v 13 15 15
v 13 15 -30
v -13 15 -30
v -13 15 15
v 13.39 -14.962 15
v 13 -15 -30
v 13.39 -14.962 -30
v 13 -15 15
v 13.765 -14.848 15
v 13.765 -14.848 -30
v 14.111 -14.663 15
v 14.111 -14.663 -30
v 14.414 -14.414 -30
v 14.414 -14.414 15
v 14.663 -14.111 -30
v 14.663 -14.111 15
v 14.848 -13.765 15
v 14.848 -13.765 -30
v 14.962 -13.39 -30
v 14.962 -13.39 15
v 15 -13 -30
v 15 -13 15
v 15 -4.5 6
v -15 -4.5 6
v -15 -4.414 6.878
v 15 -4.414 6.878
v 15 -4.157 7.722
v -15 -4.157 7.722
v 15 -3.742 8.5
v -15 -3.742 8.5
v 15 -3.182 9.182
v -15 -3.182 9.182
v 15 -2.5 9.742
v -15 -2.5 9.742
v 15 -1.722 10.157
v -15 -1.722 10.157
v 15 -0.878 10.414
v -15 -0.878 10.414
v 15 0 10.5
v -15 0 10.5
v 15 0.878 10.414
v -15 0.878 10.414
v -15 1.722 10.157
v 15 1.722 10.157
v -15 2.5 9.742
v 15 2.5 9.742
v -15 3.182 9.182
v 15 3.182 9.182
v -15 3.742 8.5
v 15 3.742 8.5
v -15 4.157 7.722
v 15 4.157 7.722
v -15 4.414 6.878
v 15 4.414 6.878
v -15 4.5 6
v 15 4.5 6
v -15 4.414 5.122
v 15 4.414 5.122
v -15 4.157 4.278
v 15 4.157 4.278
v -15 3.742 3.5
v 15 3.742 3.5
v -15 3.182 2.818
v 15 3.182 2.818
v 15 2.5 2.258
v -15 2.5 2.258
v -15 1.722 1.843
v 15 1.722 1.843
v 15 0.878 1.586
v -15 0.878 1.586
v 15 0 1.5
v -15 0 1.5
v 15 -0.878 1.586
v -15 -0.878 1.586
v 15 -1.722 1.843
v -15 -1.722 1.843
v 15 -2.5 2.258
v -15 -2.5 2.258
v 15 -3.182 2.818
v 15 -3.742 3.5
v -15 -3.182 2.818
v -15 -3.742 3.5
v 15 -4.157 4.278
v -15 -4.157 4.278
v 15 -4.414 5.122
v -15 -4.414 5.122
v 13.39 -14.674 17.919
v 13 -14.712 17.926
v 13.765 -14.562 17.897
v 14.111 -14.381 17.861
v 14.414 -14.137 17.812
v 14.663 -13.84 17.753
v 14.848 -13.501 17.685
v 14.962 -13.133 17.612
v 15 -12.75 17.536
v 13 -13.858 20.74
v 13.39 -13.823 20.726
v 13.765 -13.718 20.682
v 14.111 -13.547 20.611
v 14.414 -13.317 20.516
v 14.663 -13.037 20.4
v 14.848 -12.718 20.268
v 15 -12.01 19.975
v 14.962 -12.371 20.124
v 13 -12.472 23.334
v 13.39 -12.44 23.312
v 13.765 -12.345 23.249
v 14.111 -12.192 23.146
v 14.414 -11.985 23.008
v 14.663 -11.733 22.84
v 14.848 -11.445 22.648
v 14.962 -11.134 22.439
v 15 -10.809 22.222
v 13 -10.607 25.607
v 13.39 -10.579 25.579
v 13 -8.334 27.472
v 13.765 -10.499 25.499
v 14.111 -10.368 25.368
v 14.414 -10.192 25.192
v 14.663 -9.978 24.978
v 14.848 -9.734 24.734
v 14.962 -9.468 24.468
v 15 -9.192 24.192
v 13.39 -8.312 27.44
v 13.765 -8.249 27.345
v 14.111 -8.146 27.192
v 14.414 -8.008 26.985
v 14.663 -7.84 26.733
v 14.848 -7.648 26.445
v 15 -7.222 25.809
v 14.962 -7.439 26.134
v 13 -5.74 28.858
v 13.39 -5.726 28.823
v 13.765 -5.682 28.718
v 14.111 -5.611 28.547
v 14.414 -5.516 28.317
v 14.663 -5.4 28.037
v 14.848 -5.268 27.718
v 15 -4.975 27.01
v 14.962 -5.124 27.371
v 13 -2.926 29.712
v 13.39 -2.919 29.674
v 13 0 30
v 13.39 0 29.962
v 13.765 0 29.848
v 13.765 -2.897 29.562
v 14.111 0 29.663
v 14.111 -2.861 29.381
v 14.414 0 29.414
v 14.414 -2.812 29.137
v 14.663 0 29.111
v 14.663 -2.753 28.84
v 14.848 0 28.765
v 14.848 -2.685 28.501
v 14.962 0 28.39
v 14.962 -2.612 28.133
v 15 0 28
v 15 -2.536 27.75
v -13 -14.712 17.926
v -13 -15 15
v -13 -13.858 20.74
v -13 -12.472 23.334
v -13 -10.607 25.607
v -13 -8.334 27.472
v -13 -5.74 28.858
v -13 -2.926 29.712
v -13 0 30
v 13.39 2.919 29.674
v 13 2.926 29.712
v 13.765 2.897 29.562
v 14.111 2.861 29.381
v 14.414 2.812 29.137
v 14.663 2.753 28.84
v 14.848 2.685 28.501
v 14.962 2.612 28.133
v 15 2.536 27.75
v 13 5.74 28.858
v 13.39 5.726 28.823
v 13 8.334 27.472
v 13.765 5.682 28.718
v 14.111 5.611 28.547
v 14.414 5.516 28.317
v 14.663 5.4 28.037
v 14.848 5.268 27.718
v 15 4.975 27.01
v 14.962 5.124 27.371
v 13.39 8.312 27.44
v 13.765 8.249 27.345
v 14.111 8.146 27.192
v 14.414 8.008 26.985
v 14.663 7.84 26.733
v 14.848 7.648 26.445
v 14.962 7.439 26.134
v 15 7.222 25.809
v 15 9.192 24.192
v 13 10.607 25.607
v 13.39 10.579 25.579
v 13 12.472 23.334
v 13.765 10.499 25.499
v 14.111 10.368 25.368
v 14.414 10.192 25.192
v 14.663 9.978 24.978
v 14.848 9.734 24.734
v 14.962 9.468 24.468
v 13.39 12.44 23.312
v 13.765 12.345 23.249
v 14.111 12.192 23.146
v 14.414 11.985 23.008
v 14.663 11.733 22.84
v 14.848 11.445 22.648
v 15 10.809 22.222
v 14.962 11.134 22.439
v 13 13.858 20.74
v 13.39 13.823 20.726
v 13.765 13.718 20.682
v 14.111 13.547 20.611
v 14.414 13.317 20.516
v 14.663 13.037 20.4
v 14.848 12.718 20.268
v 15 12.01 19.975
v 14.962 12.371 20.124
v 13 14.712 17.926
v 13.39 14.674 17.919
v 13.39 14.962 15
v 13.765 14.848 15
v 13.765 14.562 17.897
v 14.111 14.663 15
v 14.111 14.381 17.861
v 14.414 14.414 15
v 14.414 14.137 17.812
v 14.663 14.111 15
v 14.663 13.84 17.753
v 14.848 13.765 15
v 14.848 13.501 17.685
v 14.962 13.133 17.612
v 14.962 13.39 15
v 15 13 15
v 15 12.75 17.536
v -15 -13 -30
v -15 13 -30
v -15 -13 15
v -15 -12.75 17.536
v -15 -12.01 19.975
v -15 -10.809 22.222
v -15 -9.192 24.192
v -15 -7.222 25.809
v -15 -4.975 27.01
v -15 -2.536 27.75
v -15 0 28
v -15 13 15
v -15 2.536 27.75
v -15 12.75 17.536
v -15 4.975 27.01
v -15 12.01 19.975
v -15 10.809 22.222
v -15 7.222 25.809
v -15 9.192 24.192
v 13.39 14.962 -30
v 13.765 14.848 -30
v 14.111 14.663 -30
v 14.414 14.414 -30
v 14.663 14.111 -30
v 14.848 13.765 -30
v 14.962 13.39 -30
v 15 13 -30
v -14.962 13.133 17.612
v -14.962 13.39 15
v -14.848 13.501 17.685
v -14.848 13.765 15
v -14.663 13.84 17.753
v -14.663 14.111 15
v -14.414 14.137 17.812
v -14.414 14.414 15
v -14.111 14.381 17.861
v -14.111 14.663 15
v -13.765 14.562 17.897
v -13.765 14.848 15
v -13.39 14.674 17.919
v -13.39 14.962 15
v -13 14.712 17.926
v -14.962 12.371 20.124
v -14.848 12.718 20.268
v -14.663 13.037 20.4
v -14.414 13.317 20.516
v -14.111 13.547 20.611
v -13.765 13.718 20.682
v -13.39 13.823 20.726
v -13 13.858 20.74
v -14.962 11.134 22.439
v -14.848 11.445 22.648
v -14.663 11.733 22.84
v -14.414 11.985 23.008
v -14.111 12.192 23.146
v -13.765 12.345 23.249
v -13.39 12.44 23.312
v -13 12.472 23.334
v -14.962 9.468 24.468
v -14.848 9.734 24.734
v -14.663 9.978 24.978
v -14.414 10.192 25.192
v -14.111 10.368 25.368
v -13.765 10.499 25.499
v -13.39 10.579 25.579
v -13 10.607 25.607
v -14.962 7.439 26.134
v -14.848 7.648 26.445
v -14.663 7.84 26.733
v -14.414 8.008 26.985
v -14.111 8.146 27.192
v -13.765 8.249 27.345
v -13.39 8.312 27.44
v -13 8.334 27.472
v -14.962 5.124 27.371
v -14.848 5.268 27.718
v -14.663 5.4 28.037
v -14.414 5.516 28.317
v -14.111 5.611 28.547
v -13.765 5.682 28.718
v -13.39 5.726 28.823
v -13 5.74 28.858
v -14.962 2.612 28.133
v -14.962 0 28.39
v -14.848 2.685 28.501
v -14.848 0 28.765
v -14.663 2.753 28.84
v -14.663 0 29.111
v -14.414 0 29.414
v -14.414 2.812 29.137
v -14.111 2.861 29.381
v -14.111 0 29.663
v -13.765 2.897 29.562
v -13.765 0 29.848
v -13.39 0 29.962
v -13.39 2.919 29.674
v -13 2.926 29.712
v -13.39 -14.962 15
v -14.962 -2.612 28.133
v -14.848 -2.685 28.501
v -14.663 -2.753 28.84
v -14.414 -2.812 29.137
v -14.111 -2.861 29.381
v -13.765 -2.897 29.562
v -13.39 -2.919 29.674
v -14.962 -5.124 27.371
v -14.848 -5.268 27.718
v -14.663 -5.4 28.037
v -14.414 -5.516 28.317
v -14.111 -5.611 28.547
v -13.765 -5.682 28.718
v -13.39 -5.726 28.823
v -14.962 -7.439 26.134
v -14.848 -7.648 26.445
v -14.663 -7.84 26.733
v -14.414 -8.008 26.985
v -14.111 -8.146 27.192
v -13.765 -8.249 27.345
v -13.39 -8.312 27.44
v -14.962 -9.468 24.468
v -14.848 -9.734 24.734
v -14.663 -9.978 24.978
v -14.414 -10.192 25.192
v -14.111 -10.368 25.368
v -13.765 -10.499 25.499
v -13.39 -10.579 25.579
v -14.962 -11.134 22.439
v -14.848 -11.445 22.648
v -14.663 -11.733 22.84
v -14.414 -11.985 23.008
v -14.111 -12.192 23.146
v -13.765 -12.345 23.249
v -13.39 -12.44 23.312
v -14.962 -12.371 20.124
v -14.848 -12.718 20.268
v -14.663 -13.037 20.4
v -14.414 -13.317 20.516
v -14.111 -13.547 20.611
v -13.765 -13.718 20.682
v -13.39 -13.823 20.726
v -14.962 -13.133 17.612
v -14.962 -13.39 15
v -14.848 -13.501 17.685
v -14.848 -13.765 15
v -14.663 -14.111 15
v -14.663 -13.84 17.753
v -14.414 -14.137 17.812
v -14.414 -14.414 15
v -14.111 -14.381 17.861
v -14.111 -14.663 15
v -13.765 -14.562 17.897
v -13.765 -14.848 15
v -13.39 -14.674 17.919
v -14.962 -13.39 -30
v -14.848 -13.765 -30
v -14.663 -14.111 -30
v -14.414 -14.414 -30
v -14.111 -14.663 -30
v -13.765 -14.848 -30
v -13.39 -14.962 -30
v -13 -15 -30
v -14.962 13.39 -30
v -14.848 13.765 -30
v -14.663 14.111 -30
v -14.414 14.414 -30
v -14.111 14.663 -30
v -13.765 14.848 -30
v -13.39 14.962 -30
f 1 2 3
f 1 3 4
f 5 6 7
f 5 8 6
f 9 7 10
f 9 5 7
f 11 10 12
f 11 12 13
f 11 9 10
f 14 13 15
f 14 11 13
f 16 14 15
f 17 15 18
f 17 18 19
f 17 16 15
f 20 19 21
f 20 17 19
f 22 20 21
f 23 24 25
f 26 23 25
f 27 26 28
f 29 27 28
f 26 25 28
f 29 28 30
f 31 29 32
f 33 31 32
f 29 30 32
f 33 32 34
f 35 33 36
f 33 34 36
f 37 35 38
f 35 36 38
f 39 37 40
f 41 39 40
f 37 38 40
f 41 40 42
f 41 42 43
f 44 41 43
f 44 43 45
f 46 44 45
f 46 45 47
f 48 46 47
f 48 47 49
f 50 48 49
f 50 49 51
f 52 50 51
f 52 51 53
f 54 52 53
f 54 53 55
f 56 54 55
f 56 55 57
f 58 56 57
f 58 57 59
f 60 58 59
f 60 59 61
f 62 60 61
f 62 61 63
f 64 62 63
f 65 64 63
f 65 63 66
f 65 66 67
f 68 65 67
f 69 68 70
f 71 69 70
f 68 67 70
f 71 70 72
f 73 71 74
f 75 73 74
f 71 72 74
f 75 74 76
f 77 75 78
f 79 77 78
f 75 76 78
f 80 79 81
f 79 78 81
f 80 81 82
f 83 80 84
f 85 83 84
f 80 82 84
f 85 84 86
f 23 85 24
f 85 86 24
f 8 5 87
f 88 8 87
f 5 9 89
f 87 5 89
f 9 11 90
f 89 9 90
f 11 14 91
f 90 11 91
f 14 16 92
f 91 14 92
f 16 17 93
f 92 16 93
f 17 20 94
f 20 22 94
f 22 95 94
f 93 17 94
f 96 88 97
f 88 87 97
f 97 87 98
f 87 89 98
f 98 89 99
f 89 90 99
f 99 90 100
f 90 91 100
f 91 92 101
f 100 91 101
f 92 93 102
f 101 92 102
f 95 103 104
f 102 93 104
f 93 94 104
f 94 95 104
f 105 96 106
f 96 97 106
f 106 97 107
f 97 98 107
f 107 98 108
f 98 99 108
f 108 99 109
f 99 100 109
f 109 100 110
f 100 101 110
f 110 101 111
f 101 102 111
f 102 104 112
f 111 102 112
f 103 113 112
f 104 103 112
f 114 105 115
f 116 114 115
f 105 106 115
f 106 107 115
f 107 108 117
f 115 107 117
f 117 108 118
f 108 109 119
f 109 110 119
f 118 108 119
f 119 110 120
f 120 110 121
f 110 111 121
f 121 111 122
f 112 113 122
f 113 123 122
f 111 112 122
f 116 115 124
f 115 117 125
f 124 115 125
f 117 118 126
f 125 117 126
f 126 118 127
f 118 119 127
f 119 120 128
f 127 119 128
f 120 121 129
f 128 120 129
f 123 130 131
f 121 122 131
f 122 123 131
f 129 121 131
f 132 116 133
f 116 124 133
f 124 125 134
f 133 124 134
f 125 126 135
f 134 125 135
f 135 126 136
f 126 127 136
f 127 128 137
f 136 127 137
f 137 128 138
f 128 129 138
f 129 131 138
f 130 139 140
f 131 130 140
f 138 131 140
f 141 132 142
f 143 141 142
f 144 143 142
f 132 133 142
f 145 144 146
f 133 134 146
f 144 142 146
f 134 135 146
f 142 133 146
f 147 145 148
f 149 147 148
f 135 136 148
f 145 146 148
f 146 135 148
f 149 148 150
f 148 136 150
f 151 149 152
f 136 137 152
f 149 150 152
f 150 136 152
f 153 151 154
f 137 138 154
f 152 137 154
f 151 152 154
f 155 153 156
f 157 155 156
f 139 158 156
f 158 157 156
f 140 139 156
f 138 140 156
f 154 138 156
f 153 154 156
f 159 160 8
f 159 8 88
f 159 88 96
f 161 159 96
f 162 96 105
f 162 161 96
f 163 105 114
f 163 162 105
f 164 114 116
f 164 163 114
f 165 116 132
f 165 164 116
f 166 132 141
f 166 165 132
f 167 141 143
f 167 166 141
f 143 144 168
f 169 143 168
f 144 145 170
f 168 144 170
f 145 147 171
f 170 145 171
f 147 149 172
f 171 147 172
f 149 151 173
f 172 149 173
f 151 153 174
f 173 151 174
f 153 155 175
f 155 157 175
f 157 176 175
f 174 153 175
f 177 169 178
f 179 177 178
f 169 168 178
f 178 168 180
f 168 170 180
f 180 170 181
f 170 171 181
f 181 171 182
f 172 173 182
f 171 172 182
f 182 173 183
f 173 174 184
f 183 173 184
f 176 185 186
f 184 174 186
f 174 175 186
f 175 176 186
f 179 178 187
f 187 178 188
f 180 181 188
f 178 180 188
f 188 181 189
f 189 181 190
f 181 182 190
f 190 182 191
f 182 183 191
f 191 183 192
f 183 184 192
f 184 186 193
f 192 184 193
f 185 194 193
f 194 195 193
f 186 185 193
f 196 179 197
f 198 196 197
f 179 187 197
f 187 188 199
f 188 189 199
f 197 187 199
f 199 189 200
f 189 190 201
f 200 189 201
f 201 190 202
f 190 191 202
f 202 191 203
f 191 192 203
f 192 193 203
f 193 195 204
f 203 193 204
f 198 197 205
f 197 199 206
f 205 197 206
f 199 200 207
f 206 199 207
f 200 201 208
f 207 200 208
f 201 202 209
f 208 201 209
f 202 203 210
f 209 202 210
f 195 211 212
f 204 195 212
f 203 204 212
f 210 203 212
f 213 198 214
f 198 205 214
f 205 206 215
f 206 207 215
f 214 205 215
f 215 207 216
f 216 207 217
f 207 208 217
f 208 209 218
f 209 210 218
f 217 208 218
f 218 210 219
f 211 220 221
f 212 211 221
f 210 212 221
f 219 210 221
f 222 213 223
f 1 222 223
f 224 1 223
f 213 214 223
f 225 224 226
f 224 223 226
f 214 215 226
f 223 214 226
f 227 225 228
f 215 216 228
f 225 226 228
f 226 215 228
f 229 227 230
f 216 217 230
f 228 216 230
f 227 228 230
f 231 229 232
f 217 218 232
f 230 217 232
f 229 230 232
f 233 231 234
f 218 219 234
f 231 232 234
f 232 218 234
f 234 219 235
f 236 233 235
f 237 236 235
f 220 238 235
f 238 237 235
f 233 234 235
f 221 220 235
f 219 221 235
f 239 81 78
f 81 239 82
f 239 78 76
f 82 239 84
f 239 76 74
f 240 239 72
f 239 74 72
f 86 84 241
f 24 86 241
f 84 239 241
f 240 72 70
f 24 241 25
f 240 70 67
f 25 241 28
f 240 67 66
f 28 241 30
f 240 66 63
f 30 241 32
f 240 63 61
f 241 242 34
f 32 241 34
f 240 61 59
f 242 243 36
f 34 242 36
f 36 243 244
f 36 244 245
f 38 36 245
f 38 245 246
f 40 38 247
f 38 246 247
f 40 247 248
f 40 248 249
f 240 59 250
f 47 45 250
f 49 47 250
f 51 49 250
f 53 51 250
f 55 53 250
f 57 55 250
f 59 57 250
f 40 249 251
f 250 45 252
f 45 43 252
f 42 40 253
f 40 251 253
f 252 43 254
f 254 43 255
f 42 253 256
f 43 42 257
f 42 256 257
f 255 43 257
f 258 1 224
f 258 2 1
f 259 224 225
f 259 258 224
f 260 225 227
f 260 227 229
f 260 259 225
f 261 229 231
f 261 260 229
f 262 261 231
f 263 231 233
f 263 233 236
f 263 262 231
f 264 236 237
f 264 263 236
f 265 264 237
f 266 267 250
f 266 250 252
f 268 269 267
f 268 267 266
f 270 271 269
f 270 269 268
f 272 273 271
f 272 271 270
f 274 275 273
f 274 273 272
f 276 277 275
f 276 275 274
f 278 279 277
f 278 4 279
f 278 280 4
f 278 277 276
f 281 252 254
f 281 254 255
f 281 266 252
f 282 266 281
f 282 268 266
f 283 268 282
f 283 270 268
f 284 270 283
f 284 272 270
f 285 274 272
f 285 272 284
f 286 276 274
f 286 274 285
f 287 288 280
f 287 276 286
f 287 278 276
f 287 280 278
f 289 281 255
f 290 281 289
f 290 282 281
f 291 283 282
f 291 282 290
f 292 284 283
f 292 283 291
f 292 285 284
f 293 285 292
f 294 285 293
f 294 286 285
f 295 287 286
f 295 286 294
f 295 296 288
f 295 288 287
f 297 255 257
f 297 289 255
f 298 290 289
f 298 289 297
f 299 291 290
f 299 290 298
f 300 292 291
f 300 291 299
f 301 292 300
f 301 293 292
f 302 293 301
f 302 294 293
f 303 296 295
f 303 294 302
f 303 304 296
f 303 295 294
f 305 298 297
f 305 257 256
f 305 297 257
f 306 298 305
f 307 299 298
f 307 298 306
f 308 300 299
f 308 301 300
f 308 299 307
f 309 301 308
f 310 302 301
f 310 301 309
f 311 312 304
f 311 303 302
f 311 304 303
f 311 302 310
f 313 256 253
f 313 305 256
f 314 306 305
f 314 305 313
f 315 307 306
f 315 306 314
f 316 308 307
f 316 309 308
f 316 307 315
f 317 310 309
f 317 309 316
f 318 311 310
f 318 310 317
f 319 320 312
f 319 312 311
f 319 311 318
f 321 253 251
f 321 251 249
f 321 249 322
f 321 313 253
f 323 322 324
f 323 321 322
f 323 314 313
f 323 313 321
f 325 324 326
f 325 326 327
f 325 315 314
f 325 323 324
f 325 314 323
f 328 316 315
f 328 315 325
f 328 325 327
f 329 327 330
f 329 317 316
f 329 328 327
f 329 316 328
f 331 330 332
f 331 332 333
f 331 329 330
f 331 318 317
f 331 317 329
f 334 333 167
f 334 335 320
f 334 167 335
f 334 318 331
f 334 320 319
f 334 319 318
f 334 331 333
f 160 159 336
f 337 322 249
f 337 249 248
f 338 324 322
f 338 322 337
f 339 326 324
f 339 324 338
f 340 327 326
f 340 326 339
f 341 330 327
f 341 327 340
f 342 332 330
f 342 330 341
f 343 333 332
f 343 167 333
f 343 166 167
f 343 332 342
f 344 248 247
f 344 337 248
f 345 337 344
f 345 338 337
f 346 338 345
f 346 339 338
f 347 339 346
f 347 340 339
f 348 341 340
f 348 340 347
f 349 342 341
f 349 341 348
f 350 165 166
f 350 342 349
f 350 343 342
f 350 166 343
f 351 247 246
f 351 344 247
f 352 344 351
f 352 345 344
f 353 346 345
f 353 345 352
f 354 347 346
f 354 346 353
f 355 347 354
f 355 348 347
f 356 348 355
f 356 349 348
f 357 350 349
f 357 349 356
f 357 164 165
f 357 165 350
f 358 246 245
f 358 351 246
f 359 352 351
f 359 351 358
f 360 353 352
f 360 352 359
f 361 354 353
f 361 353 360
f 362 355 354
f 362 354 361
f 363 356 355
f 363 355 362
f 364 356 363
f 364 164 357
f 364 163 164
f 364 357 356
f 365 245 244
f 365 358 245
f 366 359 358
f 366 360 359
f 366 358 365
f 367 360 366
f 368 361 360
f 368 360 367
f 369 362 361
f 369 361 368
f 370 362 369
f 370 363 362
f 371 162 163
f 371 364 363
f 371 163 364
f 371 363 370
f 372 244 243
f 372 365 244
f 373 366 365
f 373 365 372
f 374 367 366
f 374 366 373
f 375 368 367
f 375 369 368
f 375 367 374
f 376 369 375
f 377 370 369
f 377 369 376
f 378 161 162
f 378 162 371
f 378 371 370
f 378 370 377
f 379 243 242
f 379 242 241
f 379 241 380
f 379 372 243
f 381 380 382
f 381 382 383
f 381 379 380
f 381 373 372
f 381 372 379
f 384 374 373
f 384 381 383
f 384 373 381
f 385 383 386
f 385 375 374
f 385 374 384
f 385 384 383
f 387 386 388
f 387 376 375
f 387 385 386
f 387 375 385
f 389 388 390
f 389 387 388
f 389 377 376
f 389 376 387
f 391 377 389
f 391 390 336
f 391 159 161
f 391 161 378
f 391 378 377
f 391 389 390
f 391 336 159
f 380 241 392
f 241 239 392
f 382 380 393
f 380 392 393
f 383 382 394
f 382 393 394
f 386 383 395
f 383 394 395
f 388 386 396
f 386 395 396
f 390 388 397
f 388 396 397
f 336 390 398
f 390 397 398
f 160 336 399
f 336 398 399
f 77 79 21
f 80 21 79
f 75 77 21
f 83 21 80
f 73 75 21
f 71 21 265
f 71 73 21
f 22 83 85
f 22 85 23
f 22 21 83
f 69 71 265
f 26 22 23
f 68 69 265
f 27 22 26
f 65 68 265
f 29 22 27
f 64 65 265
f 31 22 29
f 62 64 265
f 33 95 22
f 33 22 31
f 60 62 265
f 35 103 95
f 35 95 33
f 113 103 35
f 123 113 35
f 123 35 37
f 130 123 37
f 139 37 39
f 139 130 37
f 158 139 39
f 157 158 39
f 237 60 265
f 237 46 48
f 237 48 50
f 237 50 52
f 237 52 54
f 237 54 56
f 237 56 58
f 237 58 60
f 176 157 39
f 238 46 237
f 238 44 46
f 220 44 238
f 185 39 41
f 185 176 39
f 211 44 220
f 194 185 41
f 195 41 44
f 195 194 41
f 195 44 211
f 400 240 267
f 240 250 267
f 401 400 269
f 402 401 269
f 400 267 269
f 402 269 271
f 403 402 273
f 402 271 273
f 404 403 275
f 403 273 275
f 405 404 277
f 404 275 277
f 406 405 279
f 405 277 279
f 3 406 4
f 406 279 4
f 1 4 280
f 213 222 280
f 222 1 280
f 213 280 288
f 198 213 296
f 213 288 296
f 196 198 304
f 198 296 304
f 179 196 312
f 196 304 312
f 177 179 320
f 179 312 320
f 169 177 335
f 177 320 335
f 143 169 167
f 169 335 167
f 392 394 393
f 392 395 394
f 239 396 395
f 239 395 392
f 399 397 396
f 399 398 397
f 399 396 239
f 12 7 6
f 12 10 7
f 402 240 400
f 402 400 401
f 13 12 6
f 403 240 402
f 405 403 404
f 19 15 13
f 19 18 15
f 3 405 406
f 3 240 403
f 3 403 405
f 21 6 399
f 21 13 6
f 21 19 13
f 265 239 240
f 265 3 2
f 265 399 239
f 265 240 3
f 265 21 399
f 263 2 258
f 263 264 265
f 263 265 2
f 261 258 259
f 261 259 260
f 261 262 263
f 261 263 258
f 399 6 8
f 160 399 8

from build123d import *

# Parameters (mm, degrees)
F0_W     = 30
F0_H     = 60
F1_DEPTH = 15
F3_R     = 14.99999
F4_R     = 2
F5_D     = 9


# Not quite as in the source:
# - a fillet or chamfer is up to 0.001 mm smaller than in the source, because OpenCascade refuses the exact size


with BuildPart() as f1:
    # F0 (on Right) → F1 (new body, symmetric)
    with BuildSketch(Plane.YZ):
        Rectangle(F0_W, F0_H)
    extrude(amount=F1_DEPTH, both=True)

    # F3 (radius 15 in the source; OpenCascade refuses exactly that, so slightly less here)
    f3_edges = [f1.edges().sort_by_distance(p)[0] for p in [
        (0, -15, 30),
        (0, 15, 30),
    ]]
    fillet(f3_edges, radius=F3_R)

    # F4
    f4_edges = [f1.edges().sort_by_distance(p)[0] for p in [
        (15, -15, -7.499995),
        (-15, 15, -7.499995),
        (-15, -10.606605, 25.606605),
    ]]
    fillet(f4_edges, radius=F4_R)

    # F5 (through all)
    with Locations(Plane.YZ.offset(15)):
        with Locations((0, 6)):
            Hole(F5_D / 2)


solid = f1.part
